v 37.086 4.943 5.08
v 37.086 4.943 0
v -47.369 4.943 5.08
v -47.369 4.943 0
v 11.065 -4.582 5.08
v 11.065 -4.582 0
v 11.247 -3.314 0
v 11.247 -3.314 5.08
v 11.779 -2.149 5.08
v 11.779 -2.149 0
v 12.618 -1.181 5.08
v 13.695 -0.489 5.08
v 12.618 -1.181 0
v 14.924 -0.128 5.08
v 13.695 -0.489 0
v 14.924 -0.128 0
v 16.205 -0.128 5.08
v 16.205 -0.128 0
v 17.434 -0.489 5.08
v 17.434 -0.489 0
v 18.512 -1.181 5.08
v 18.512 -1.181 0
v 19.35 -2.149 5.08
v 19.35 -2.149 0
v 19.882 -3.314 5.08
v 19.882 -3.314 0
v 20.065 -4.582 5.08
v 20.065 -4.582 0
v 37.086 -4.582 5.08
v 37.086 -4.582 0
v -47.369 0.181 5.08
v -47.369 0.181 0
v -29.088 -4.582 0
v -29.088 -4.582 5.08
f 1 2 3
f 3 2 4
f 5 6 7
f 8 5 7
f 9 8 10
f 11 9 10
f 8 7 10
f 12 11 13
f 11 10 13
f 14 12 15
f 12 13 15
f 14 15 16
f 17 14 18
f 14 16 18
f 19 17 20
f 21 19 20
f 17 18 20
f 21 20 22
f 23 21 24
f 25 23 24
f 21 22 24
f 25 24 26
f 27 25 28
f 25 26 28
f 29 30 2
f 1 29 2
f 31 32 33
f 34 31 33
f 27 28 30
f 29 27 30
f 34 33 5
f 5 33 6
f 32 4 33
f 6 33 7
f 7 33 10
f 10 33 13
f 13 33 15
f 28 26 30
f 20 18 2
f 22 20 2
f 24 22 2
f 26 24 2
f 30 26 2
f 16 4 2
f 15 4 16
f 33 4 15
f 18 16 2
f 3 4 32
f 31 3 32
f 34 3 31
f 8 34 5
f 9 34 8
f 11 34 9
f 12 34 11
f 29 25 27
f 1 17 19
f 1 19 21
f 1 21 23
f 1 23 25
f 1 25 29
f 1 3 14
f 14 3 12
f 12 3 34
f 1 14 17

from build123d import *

# Parameters (mm, degrees)
F1_DEPTH = 5.08


with BuildPart() as f1:
    # F0 (on Top) → F1 (new body)
    with BuildSketch(Plane.XY):
        with BuildLine():
            Line((-17.206924, 4.943109), (-47.369424, 4.943109))
            Line((-47.369424, 4.943109), (-47.369424, 0.180609))
            Line((-47.369424, 0.180609), (-29.087516, -4.581891))
            Line((-29.087516, -4.581891), (11.064883, -4.581891))
            ThreePointArc((11.064883, -4.581891), (15.564746, -0.082027), (20.064609, -4.581891))
            Line((20.064609, -4.581891), (37.086151, -4.581891))
            Line((37.086151, -4.581891), (37.086151, 4.943109))
            Line((37.086151, 4.943109), (19.306151, 4.943109))
            Line((19.306151, 4.943109), (12.955576, 4.943109))
            Line((12.955576, 4.943109), (-17.206924, 4.943109))
        make_face()
    extrude(amount=F1_DEPTH)


solid = f1.part
